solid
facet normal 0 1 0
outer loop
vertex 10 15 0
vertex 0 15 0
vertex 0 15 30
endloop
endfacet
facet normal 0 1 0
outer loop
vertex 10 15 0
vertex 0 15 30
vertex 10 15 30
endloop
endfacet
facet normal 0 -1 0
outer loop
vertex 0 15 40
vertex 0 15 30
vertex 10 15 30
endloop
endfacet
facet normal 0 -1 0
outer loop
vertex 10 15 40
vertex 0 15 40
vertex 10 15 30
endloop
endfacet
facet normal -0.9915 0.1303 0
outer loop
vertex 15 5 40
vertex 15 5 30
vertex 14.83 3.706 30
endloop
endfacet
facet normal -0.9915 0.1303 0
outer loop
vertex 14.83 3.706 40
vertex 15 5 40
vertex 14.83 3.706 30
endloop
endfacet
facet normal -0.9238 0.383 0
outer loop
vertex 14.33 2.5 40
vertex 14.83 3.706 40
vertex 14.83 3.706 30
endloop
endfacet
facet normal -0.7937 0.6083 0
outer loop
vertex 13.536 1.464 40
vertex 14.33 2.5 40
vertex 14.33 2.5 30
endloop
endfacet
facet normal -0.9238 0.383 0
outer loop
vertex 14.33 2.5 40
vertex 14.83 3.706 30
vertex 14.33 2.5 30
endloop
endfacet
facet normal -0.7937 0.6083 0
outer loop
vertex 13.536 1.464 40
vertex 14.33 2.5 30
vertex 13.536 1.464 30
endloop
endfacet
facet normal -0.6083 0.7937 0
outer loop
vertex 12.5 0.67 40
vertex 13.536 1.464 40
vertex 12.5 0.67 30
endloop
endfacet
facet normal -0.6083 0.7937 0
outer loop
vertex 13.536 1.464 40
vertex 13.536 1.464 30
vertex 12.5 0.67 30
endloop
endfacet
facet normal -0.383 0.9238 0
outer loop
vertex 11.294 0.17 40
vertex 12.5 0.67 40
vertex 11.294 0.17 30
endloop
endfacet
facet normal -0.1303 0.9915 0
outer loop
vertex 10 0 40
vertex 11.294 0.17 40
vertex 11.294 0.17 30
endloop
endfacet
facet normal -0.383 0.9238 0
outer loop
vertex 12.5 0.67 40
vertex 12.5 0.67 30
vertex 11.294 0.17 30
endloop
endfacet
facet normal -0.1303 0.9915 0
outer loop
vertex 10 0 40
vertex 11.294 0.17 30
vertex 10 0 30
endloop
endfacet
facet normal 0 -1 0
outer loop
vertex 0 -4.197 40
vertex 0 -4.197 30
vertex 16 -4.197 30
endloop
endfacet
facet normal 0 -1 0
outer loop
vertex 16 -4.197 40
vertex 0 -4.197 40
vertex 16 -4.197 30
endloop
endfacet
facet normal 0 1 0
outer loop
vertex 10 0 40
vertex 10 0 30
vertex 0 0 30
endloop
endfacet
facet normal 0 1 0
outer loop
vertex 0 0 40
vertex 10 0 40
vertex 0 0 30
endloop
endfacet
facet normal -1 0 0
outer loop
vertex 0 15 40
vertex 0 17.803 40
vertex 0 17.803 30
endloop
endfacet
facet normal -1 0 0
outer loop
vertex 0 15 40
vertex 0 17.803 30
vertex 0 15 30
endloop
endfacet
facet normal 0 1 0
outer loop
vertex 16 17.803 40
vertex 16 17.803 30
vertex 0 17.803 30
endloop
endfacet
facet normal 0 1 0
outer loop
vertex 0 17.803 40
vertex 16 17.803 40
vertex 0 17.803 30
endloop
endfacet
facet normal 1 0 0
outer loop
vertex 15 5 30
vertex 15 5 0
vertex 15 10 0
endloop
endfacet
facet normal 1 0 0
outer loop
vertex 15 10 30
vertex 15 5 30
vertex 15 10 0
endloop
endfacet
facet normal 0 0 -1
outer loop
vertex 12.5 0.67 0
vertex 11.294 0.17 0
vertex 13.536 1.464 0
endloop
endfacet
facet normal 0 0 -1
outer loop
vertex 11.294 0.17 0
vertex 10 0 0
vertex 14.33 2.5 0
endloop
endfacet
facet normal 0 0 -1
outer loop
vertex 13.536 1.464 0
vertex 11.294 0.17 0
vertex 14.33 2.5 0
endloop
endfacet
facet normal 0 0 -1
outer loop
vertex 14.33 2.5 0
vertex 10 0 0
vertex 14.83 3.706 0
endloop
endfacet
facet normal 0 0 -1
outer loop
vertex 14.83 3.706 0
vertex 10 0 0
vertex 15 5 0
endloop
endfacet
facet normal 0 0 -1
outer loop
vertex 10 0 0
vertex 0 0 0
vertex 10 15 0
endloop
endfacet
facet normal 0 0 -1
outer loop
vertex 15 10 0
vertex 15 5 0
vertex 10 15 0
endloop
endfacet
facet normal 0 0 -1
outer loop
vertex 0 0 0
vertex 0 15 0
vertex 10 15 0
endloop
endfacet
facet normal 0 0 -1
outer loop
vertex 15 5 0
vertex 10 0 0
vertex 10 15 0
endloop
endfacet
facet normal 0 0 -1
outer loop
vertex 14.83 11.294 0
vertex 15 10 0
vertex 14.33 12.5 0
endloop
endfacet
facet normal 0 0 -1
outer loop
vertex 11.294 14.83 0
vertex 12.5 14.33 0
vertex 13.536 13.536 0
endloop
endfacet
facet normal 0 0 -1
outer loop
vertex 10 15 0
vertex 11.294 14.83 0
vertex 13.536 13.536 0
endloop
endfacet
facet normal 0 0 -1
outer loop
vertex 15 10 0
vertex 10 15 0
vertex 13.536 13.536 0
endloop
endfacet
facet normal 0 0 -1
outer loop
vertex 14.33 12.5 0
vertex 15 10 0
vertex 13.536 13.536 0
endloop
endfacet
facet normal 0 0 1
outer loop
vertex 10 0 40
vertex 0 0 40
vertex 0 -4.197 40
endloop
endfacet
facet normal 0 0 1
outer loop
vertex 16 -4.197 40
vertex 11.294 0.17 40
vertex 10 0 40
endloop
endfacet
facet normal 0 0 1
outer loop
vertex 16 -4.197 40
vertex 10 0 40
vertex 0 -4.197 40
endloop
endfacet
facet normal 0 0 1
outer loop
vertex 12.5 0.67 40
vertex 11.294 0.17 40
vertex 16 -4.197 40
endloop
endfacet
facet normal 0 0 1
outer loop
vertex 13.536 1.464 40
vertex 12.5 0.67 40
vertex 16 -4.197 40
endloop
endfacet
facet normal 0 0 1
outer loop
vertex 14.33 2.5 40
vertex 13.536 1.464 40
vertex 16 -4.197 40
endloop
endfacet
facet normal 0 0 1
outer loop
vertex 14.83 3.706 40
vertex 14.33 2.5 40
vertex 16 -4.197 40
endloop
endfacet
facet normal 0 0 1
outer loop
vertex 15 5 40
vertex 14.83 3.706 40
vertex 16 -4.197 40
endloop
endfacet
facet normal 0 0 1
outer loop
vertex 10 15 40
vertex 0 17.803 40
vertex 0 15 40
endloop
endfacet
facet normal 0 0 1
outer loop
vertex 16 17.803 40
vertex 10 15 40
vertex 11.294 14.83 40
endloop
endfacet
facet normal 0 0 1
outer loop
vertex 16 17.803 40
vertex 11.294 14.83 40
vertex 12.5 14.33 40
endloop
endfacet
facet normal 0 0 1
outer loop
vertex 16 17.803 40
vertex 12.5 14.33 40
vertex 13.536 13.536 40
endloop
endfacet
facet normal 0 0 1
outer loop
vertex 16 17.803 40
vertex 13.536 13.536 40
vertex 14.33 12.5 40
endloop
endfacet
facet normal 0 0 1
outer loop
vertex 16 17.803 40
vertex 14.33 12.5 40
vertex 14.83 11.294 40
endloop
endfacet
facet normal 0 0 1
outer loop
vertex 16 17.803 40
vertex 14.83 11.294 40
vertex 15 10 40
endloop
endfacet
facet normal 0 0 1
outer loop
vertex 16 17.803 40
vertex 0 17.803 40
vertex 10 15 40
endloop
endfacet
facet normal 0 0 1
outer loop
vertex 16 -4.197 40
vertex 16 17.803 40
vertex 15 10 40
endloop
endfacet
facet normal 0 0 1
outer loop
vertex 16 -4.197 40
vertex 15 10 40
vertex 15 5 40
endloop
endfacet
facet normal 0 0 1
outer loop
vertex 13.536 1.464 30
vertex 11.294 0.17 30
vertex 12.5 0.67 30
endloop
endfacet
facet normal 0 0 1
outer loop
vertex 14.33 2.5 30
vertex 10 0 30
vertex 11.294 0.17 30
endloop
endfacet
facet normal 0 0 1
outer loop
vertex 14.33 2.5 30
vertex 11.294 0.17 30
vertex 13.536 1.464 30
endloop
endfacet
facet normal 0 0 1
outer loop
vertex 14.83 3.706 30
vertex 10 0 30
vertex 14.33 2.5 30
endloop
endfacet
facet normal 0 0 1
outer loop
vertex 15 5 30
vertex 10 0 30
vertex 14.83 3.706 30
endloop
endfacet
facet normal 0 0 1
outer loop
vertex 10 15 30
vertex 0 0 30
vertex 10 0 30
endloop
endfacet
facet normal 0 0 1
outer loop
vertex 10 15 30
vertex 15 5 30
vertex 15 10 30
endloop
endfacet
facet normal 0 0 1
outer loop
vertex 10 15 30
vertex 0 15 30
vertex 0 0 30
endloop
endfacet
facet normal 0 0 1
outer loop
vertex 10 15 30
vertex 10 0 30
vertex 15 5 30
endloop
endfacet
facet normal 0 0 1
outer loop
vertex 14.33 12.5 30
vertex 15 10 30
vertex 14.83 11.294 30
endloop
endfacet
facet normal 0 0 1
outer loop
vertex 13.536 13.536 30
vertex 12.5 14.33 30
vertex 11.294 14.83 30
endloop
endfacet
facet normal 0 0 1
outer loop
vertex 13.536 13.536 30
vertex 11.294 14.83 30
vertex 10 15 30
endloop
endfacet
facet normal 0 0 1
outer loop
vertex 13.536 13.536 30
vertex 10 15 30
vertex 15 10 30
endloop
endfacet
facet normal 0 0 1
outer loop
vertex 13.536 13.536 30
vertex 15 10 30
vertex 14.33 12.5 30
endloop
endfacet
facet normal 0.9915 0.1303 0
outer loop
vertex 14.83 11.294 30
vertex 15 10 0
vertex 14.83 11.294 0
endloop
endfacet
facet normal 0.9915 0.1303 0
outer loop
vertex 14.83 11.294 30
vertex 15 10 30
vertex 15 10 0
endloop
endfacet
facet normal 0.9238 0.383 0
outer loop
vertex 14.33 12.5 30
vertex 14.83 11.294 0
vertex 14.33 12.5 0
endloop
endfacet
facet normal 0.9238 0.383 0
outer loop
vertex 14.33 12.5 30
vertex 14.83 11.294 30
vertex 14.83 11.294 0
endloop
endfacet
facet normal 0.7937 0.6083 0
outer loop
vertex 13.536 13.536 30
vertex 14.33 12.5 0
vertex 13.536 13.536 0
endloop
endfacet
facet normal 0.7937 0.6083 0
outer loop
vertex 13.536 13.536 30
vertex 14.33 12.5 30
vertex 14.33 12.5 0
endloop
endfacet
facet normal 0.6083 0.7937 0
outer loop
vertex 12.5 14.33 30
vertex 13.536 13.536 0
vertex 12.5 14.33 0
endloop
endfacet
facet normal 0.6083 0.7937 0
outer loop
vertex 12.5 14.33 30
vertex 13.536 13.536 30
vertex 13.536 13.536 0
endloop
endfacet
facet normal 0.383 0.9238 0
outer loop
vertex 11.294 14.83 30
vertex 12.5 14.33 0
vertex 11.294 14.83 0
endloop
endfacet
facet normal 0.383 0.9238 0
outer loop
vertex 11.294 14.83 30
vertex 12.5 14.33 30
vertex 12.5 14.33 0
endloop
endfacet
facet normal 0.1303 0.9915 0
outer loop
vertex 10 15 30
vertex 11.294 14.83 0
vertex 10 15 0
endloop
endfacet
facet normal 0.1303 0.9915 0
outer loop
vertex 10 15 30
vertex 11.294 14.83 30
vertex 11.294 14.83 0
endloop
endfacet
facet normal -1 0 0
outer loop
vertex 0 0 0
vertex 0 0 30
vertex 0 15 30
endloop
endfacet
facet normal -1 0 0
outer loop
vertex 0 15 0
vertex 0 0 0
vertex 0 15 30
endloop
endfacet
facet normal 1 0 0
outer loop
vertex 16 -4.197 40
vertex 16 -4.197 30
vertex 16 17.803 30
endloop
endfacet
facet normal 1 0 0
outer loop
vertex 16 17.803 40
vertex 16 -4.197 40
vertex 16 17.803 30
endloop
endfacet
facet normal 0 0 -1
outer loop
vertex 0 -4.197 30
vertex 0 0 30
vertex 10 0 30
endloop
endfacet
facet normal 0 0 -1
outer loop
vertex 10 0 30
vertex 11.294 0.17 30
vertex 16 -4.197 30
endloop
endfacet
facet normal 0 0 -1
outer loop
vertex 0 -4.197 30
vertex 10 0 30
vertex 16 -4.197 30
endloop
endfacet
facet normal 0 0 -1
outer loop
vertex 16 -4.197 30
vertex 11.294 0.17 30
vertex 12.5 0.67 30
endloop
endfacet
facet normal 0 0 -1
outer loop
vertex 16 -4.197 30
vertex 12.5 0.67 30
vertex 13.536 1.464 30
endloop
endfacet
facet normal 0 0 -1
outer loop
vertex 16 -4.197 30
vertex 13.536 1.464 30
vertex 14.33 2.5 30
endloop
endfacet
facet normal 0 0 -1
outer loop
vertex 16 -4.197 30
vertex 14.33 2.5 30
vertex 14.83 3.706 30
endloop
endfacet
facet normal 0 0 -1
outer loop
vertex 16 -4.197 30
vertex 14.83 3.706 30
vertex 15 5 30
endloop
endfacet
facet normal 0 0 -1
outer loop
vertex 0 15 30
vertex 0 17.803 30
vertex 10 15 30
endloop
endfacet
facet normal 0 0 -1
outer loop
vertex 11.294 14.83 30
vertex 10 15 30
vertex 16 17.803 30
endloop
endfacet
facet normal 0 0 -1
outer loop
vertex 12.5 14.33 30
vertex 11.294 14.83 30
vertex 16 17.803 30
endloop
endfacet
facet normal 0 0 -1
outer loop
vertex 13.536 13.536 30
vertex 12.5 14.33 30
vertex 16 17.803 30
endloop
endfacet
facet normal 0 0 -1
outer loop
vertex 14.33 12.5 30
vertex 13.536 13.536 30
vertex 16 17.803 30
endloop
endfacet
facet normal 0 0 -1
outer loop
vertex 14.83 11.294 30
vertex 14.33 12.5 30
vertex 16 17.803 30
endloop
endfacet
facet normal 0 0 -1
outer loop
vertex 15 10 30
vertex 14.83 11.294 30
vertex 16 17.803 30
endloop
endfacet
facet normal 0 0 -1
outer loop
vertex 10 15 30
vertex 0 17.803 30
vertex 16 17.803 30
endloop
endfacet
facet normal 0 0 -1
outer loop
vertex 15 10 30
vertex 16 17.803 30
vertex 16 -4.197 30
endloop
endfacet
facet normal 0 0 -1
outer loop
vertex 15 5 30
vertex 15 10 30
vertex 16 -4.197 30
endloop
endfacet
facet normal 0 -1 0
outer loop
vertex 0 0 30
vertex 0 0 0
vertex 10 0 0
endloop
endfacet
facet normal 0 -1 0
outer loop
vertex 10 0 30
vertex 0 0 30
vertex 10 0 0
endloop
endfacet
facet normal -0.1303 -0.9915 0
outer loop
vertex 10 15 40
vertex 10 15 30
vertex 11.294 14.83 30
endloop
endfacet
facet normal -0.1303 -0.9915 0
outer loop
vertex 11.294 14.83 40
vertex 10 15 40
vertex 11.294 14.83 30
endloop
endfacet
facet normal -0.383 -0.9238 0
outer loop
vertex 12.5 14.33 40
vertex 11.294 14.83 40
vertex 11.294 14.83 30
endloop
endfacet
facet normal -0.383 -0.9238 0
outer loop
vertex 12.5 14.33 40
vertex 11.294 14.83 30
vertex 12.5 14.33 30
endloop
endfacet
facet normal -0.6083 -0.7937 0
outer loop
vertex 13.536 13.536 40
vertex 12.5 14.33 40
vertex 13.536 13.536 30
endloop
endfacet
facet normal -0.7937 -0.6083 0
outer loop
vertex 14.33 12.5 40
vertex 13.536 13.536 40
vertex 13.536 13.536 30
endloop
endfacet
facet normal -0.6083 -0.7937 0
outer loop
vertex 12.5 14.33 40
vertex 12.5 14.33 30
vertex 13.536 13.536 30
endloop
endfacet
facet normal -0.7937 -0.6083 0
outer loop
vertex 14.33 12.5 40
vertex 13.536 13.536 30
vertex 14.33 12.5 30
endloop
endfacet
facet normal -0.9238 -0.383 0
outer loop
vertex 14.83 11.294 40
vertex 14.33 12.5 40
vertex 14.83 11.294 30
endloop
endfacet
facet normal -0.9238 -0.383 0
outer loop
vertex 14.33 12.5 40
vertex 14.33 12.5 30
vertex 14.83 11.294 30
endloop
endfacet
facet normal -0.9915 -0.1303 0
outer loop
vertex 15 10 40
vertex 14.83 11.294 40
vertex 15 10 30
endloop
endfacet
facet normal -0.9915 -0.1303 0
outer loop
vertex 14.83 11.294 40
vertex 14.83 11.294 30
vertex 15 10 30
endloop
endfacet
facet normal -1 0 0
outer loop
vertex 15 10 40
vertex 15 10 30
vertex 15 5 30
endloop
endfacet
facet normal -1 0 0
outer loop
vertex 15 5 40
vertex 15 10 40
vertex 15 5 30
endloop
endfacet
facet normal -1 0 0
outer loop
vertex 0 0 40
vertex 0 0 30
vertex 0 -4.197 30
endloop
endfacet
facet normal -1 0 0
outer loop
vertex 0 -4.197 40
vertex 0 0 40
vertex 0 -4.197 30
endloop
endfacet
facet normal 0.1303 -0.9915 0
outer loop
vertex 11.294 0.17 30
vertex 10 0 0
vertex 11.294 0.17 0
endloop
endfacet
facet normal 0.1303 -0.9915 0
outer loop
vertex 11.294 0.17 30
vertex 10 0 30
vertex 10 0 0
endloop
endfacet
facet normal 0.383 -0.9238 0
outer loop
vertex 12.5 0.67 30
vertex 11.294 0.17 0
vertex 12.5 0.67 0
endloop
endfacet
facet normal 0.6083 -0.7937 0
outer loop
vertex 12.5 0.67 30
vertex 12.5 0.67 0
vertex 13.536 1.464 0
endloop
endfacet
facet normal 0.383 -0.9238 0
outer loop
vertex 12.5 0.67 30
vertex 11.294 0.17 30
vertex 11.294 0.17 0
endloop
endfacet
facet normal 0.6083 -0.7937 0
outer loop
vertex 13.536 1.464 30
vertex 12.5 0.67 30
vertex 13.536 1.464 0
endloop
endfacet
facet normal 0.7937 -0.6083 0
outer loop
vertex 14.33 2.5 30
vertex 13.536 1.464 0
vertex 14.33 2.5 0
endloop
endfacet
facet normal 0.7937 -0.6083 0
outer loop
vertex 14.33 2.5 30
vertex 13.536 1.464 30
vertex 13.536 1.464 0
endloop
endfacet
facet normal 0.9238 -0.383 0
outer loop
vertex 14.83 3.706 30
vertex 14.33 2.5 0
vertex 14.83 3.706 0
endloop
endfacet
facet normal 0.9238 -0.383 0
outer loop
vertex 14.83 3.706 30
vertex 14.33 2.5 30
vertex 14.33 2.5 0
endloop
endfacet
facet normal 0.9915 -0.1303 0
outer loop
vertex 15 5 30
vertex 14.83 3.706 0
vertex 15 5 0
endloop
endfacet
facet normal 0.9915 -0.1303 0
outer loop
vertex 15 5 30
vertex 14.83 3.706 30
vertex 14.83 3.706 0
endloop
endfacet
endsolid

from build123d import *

# Parameters (mm, degrees)
F0_W     = 15
F0_H     = 15
F1_DEPTH = 30
F2_R     = 5
F4_DEPTH = 10


# Not quite as in the source:
# - ends of sketch curves that miss each other by under 0.0002 mm in the source are joined


with BuildPart() as f1:
    # F0 (on Top) → F1 (new body)
    with BuildSketch(Plane.XY):
        with Locations((7.5, 7.5)):
            Rectangle(F0_W, F0_H)
    extrude(amount=F1_DEPTH)

    # F2
    f2_edges = [f1.edges().sort_by_distance(p)[0] for p in [
        (15, 0, 15),
        (15, 15, 15),
    ]]
    fillet(f2_edges, radius=F2_R)


with BuildPart() as f4:
    # F3 (on face) → F4 (new body)
    with BuildSketch(Plane.XY.offset(30)):
        with BuildLine():
            Line((15.9999990687, -4.1973348707), (15.9999990687, 17.8026651293))
            Line((15.9999990687, 17.8026651293), (-9.313e-07, 17.8026651293))
            Line((-9.313e-07, 17.8026651293), (-9.313e-07, 15))
            Line((-9.313e-07, 15), (10, 15))
            ThreePointArc((10, 15), (13.5355339059, 13.5355339059), (15, 10))
            Line((15, 10), (15, 5))
            ThreePointArc((15, 5), (13.5355339059, 1.4644660941), (10, 0))
            Line((10, 0), (0, 0))
            Line((0, 0), (-9.313e-07, -4.1973348707))
            Line((-9.313e-07, -4.1973348707), (15.9999990687, -4.1973348707))
        make_face()
    extrude(amount=F4_DEPTH)


solid = Compound([f1.part, f4.part])
